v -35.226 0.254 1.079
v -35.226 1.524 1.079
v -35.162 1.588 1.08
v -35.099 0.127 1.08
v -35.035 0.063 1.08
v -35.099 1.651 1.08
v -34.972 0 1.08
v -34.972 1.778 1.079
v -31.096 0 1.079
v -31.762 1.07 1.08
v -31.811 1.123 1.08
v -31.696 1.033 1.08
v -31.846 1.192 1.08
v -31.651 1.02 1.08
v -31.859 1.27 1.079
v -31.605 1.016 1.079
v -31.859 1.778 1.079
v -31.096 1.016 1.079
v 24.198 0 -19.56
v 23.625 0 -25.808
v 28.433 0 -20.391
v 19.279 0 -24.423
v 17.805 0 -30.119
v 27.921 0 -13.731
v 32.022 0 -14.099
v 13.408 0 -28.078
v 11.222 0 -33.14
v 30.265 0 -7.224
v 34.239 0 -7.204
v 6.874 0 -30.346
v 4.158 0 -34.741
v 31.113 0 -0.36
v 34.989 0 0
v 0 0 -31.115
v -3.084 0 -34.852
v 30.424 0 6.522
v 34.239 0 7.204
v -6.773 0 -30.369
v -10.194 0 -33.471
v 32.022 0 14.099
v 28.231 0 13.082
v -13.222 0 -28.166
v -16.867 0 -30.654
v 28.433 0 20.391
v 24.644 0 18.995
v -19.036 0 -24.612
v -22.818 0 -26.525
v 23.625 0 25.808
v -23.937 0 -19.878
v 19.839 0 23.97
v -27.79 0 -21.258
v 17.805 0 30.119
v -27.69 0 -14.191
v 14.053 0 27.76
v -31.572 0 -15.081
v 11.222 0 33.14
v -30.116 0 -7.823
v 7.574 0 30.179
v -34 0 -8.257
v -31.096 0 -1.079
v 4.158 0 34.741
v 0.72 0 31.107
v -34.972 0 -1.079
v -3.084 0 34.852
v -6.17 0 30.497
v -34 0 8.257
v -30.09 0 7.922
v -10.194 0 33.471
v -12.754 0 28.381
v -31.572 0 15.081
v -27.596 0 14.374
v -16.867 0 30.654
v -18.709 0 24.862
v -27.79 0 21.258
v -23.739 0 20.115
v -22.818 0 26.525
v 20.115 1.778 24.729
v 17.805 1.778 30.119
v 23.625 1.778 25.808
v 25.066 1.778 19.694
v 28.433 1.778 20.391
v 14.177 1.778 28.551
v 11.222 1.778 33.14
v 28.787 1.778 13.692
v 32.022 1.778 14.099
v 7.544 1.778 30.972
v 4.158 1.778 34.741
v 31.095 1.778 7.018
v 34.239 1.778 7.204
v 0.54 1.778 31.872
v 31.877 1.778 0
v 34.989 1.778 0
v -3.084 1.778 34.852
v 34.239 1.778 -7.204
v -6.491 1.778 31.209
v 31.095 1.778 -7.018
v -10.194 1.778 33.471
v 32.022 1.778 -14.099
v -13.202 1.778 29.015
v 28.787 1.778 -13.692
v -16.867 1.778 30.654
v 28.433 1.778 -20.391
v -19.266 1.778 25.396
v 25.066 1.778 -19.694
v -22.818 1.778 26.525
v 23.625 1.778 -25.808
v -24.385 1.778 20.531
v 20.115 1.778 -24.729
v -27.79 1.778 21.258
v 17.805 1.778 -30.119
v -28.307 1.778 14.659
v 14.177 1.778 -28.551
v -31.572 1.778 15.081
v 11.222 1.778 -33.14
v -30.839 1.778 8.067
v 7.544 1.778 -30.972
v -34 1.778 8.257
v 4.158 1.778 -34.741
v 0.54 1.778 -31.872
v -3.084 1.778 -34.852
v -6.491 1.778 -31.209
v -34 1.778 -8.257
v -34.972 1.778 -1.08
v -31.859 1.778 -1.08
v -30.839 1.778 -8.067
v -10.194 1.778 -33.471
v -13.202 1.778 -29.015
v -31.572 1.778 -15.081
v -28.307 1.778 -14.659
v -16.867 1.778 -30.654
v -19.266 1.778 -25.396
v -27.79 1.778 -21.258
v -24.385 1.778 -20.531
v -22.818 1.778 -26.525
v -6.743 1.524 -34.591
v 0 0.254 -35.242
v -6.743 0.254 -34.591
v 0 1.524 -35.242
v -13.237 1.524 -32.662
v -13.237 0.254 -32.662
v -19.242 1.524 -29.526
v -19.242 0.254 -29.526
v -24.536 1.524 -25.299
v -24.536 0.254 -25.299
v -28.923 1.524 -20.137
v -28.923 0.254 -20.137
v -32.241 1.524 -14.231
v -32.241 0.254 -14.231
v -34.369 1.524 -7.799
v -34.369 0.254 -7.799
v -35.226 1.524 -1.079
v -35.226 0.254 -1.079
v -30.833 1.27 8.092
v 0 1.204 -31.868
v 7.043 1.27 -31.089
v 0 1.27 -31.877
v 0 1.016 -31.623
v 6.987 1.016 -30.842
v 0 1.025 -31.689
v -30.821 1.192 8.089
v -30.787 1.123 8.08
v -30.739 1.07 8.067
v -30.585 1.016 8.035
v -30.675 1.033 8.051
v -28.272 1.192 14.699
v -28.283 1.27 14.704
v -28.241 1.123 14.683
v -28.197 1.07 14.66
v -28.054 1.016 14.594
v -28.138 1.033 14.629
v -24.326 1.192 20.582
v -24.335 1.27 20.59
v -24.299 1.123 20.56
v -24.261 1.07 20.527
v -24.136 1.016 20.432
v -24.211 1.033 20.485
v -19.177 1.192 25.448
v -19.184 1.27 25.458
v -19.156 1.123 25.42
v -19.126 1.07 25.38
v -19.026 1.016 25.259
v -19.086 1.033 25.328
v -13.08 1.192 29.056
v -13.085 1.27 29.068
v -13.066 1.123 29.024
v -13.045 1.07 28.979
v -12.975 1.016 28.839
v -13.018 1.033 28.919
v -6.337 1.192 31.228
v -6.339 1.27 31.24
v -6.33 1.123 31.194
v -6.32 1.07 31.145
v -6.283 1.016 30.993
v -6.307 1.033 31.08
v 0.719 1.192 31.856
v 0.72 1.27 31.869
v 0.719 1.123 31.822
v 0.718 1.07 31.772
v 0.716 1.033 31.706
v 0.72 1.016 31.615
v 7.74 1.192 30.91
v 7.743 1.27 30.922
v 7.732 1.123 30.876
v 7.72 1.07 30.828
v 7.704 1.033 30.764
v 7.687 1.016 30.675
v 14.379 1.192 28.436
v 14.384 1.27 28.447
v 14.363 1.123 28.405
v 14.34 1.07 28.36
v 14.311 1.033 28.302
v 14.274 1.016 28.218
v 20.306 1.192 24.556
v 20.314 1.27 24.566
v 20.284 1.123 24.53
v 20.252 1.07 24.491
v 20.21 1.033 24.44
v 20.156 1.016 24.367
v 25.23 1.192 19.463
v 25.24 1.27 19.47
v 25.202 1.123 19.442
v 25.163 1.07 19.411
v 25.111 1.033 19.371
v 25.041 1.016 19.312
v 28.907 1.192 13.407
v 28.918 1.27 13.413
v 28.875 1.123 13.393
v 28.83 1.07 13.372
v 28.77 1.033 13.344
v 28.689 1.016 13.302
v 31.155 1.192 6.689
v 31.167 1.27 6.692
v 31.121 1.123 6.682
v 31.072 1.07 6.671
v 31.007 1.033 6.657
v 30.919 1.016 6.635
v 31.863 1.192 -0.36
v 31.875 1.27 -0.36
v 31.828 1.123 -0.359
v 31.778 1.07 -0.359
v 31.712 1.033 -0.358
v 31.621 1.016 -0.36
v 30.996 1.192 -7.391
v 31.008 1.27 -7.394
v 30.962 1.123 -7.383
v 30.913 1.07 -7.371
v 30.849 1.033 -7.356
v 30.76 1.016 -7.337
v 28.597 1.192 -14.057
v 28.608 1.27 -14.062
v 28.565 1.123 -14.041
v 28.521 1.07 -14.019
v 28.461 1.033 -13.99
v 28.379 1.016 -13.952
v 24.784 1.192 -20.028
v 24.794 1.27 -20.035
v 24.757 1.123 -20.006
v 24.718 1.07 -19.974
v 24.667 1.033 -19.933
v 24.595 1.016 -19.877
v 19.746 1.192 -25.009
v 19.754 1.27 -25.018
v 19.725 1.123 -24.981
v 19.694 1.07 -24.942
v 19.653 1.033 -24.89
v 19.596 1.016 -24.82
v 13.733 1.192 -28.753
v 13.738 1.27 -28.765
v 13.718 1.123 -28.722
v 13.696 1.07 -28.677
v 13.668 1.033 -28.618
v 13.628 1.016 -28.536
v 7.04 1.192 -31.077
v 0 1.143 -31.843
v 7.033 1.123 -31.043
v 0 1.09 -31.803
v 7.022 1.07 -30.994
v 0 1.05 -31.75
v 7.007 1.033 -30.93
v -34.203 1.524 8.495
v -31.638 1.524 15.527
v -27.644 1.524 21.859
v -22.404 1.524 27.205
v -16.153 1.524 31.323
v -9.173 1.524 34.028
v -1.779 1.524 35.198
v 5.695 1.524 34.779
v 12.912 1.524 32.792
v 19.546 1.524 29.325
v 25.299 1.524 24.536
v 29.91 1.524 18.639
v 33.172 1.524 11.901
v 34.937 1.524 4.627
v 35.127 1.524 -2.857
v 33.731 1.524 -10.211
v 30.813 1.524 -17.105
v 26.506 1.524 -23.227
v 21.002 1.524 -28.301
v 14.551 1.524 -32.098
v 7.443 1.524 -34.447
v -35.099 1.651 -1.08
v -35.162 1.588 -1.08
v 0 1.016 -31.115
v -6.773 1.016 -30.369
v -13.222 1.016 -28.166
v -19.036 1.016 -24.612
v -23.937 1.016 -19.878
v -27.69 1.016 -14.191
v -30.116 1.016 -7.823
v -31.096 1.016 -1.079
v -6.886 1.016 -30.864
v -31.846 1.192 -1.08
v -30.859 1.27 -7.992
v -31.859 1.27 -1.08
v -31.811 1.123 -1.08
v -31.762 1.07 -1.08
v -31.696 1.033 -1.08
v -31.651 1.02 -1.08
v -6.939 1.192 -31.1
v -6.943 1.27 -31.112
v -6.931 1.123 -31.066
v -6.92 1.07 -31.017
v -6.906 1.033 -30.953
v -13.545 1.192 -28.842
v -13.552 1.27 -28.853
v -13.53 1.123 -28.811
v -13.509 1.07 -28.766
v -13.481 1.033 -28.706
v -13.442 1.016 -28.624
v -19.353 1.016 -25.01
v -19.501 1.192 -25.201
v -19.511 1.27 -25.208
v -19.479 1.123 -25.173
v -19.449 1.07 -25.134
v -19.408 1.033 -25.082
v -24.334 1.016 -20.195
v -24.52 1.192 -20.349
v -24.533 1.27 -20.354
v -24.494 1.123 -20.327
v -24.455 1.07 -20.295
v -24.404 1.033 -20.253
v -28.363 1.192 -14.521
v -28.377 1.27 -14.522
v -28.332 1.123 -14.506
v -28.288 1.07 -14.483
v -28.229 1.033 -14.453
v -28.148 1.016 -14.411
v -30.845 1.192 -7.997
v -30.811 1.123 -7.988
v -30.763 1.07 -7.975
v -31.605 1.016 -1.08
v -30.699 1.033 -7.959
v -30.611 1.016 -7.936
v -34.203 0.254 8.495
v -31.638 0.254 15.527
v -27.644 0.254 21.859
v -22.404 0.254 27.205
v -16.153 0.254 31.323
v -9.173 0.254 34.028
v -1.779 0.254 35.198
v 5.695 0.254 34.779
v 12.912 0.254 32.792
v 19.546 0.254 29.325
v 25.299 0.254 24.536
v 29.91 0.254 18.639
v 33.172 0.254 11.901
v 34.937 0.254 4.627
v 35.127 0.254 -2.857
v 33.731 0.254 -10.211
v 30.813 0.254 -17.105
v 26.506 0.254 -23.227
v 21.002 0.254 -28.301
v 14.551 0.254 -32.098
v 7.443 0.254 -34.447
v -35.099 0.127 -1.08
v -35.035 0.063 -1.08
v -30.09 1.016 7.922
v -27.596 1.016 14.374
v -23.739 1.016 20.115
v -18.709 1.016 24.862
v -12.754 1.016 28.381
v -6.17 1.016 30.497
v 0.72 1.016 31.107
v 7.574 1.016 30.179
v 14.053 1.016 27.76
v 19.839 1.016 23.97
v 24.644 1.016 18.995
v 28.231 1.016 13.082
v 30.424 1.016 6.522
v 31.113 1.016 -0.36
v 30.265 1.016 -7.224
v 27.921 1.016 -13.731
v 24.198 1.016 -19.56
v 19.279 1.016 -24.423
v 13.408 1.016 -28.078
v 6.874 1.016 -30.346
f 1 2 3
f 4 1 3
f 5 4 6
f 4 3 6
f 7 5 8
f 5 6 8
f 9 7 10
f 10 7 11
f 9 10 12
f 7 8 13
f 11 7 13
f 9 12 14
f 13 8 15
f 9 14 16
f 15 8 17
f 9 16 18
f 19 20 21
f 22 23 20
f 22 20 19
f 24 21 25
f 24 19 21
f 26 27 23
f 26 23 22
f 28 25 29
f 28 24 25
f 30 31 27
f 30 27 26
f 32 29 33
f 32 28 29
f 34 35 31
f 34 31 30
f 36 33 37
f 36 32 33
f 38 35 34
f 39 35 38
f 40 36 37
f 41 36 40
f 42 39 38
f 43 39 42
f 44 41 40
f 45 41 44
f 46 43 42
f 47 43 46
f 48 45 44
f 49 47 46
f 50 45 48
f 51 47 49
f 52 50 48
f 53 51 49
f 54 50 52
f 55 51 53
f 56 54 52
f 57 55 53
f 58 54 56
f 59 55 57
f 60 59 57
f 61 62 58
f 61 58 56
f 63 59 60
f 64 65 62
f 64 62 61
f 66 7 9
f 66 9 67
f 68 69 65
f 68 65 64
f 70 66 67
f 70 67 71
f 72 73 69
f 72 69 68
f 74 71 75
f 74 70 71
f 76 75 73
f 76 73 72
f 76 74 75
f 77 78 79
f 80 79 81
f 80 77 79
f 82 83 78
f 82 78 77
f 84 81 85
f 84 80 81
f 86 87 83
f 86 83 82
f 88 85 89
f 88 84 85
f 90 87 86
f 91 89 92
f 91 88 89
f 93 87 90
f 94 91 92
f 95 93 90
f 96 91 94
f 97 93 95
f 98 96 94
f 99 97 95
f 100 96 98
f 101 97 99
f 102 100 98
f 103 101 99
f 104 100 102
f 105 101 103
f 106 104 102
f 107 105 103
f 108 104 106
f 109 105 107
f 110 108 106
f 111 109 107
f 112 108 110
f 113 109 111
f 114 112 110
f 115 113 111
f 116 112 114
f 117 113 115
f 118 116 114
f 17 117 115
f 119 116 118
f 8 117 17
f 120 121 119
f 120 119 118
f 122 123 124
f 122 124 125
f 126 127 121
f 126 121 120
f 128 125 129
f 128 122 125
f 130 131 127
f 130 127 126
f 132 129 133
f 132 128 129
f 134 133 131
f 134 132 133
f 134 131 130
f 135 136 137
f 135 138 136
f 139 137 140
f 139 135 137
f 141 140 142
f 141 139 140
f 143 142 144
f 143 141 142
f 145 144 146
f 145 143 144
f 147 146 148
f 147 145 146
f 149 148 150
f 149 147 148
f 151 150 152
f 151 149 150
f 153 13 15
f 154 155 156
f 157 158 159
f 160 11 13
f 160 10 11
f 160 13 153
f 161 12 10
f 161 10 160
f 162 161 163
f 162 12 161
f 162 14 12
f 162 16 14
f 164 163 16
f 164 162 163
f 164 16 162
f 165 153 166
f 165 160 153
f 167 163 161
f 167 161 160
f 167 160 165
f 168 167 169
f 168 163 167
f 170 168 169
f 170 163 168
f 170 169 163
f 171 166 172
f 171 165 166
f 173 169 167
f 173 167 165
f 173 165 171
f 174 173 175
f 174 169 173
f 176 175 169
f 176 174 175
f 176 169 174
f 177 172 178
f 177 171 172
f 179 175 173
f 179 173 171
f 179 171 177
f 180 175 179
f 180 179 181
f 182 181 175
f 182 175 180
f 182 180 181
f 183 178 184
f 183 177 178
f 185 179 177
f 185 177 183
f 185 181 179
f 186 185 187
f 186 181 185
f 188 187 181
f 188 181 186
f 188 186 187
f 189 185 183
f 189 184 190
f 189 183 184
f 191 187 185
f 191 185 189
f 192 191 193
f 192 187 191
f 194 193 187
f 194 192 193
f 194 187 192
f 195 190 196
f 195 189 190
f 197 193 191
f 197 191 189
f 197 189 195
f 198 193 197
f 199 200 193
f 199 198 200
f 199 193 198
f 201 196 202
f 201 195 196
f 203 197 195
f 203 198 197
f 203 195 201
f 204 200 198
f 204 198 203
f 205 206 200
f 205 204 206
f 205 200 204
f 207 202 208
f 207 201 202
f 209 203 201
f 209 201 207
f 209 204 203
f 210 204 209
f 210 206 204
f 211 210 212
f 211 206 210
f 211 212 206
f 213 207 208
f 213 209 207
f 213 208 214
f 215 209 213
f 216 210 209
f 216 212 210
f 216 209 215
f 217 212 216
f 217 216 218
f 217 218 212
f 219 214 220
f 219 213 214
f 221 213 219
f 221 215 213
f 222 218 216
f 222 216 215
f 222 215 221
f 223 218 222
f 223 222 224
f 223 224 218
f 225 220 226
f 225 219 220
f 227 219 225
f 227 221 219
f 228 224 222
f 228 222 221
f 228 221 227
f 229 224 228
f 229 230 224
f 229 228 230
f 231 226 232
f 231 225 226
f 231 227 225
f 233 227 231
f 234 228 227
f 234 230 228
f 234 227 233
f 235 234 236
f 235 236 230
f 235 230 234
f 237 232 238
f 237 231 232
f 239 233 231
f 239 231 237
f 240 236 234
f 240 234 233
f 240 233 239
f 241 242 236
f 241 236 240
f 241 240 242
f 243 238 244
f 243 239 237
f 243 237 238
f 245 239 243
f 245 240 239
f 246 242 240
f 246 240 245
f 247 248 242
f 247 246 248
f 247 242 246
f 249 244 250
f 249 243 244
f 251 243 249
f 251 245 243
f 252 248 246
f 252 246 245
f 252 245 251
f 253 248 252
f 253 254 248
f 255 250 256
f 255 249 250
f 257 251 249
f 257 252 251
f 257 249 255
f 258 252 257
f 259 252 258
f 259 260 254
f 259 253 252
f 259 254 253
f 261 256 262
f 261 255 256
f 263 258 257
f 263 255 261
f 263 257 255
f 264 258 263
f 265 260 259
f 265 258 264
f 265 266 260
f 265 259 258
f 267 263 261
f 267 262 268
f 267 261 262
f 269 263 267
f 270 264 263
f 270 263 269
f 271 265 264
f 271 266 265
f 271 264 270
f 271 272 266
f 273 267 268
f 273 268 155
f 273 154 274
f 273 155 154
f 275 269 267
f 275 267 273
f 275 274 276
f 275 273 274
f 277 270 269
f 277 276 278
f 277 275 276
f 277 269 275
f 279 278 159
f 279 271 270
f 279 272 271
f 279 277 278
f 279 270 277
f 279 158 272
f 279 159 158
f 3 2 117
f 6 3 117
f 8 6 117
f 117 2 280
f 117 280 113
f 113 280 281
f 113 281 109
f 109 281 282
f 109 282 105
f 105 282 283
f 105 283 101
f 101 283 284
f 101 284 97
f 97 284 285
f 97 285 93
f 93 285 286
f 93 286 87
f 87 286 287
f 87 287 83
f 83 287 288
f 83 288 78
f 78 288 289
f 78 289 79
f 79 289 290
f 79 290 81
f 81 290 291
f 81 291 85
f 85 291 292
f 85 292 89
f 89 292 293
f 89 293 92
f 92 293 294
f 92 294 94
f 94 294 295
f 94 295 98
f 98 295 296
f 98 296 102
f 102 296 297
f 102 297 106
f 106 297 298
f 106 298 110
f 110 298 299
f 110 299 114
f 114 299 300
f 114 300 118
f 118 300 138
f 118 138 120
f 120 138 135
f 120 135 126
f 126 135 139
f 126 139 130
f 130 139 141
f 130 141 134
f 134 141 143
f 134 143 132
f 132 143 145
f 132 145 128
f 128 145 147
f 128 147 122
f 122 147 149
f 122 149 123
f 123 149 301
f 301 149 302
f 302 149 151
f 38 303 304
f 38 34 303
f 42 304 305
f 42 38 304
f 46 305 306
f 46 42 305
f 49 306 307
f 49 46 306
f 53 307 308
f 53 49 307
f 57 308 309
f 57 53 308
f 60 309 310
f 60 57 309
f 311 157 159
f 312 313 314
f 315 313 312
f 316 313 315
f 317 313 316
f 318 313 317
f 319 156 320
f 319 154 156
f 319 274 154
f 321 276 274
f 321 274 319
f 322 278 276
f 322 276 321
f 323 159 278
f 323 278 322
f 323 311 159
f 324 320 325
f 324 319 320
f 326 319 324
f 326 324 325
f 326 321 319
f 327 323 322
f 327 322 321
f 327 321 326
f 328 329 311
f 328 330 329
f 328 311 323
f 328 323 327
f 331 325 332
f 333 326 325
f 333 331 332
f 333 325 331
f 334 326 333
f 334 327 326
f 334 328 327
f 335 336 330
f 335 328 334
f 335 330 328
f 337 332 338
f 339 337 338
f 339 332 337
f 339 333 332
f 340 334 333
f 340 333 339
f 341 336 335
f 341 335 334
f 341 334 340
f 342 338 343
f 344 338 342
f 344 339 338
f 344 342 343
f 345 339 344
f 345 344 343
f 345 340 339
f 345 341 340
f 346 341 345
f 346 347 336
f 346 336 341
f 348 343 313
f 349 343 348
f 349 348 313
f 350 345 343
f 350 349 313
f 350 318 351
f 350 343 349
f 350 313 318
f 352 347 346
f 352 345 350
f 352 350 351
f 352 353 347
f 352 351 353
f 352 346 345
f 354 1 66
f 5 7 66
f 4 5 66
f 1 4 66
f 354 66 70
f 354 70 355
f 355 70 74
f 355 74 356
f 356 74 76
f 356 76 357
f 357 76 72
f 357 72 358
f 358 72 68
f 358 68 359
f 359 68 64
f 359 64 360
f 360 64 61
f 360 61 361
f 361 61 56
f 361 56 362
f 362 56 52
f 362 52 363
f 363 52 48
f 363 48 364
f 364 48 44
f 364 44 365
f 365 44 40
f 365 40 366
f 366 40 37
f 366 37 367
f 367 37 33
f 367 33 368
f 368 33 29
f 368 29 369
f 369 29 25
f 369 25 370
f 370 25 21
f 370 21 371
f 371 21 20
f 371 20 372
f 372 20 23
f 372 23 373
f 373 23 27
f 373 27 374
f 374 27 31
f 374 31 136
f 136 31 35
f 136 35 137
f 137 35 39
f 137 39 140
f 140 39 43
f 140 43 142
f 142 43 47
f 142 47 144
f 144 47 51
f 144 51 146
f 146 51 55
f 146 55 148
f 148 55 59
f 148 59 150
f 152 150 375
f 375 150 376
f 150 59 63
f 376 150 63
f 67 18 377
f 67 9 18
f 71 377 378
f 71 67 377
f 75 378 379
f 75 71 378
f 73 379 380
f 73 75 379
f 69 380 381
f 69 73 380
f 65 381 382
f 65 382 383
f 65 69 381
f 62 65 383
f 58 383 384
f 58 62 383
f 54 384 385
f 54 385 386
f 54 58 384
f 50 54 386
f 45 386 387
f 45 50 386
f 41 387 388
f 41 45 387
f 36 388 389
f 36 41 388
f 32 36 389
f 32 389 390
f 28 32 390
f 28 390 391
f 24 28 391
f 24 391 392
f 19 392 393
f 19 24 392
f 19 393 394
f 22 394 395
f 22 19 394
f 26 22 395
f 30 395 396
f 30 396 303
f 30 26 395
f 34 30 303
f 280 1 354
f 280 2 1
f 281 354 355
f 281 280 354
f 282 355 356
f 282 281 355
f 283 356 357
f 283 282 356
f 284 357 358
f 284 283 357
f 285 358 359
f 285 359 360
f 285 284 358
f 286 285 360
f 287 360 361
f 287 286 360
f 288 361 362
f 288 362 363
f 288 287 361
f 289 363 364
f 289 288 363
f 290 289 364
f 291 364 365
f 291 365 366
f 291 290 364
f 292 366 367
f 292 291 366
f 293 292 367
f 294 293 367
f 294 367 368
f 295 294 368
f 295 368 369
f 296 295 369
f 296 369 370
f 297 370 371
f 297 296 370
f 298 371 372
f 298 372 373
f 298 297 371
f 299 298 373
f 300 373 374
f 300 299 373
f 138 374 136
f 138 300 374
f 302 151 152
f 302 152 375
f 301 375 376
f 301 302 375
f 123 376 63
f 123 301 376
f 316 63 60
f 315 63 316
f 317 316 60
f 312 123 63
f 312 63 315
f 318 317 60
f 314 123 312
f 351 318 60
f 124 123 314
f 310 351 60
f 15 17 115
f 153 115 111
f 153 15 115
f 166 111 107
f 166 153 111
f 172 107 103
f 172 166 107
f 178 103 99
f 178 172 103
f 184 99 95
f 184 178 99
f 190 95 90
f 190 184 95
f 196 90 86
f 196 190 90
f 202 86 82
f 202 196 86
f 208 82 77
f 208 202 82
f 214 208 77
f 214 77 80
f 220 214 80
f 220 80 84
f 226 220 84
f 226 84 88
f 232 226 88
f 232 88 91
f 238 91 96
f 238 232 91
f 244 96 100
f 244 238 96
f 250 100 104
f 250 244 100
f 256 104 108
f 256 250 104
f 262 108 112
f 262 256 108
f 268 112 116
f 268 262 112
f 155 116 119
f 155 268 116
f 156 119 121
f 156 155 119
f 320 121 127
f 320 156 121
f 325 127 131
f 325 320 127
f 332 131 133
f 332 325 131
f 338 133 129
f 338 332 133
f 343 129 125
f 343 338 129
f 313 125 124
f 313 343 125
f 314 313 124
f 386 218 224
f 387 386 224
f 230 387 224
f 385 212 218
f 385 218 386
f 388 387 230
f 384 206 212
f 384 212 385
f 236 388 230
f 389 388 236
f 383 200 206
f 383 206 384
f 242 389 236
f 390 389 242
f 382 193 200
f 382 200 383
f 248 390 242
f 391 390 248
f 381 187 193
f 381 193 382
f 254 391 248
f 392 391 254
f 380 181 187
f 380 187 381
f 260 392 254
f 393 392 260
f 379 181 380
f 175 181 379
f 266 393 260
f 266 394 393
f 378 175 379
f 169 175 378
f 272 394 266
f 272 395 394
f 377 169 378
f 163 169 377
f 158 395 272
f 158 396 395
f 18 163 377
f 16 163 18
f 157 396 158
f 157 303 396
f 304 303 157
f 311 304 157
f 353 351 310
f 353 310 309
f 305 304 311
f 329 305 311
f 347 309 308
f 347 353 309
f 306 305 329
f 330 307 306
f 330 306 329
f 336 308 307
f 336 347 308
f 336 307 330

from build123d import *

# Parameters (mm, degrees)
FILLET1_R          = 0.254
CHAMFER1_SIZE      = 0.254
SKETCH2_W          = 4.146231659
SKETCH2_H          = 2.159
CUT_EXTRUDE1_DEPTH = 50.872125446


with BuildPart() as part:
    # Sketch1 → Revolve1 (revolve)
    with BuildSketch(Plane.XY, mode=Mode.PRIVATE) as revolve1_sk:
        Polygon((35.2425, 0), (35.2425, 1.778), (31.877, 1.778), (31.877, 1.016), (31.115, 1.016), (31.115, 0), align=None)
    revolve(revolve1_sk.sketch.rotate(Axis((0, 0, 0), (0, 1, 0)), 90), axis=Axis((0, 0, 0), (0, 1, 0)))

    # Fillet1
    fillet1_edges = [part.edges().sort_by_distance(p)[0] for p in [
        (0, 1.016, 31.877),
    ]]
    fillet(fillet1_edges, radius=FILLET1_R)

    # Chamfer1
    chamfer1_edges = [part.edges().sort_by_distance(p)[0] for p in [
        (0, 1.778, 35.2425),
        (0, 0, 35.2425),
    ]]
    chamfer(chamfer1_edges, length=CHAMFER1_SIZE)

    # Sketch2 → Cut-Extrude1 (cut, through all)
    with BuildSketch(Plane(origin=(0, 1.778, 0), x_dir=(1, 0, 0), z_dir=(0, 1, 0))):
        with Locations((-33.169384171, 0)):
            Rectangle(SKETCH2_W, SKETCH2_H)
    extrude(amount=-CUT_EXTRUDE1_DEPTH, mode=Mode.SUBTRACT)


solid = part.part
